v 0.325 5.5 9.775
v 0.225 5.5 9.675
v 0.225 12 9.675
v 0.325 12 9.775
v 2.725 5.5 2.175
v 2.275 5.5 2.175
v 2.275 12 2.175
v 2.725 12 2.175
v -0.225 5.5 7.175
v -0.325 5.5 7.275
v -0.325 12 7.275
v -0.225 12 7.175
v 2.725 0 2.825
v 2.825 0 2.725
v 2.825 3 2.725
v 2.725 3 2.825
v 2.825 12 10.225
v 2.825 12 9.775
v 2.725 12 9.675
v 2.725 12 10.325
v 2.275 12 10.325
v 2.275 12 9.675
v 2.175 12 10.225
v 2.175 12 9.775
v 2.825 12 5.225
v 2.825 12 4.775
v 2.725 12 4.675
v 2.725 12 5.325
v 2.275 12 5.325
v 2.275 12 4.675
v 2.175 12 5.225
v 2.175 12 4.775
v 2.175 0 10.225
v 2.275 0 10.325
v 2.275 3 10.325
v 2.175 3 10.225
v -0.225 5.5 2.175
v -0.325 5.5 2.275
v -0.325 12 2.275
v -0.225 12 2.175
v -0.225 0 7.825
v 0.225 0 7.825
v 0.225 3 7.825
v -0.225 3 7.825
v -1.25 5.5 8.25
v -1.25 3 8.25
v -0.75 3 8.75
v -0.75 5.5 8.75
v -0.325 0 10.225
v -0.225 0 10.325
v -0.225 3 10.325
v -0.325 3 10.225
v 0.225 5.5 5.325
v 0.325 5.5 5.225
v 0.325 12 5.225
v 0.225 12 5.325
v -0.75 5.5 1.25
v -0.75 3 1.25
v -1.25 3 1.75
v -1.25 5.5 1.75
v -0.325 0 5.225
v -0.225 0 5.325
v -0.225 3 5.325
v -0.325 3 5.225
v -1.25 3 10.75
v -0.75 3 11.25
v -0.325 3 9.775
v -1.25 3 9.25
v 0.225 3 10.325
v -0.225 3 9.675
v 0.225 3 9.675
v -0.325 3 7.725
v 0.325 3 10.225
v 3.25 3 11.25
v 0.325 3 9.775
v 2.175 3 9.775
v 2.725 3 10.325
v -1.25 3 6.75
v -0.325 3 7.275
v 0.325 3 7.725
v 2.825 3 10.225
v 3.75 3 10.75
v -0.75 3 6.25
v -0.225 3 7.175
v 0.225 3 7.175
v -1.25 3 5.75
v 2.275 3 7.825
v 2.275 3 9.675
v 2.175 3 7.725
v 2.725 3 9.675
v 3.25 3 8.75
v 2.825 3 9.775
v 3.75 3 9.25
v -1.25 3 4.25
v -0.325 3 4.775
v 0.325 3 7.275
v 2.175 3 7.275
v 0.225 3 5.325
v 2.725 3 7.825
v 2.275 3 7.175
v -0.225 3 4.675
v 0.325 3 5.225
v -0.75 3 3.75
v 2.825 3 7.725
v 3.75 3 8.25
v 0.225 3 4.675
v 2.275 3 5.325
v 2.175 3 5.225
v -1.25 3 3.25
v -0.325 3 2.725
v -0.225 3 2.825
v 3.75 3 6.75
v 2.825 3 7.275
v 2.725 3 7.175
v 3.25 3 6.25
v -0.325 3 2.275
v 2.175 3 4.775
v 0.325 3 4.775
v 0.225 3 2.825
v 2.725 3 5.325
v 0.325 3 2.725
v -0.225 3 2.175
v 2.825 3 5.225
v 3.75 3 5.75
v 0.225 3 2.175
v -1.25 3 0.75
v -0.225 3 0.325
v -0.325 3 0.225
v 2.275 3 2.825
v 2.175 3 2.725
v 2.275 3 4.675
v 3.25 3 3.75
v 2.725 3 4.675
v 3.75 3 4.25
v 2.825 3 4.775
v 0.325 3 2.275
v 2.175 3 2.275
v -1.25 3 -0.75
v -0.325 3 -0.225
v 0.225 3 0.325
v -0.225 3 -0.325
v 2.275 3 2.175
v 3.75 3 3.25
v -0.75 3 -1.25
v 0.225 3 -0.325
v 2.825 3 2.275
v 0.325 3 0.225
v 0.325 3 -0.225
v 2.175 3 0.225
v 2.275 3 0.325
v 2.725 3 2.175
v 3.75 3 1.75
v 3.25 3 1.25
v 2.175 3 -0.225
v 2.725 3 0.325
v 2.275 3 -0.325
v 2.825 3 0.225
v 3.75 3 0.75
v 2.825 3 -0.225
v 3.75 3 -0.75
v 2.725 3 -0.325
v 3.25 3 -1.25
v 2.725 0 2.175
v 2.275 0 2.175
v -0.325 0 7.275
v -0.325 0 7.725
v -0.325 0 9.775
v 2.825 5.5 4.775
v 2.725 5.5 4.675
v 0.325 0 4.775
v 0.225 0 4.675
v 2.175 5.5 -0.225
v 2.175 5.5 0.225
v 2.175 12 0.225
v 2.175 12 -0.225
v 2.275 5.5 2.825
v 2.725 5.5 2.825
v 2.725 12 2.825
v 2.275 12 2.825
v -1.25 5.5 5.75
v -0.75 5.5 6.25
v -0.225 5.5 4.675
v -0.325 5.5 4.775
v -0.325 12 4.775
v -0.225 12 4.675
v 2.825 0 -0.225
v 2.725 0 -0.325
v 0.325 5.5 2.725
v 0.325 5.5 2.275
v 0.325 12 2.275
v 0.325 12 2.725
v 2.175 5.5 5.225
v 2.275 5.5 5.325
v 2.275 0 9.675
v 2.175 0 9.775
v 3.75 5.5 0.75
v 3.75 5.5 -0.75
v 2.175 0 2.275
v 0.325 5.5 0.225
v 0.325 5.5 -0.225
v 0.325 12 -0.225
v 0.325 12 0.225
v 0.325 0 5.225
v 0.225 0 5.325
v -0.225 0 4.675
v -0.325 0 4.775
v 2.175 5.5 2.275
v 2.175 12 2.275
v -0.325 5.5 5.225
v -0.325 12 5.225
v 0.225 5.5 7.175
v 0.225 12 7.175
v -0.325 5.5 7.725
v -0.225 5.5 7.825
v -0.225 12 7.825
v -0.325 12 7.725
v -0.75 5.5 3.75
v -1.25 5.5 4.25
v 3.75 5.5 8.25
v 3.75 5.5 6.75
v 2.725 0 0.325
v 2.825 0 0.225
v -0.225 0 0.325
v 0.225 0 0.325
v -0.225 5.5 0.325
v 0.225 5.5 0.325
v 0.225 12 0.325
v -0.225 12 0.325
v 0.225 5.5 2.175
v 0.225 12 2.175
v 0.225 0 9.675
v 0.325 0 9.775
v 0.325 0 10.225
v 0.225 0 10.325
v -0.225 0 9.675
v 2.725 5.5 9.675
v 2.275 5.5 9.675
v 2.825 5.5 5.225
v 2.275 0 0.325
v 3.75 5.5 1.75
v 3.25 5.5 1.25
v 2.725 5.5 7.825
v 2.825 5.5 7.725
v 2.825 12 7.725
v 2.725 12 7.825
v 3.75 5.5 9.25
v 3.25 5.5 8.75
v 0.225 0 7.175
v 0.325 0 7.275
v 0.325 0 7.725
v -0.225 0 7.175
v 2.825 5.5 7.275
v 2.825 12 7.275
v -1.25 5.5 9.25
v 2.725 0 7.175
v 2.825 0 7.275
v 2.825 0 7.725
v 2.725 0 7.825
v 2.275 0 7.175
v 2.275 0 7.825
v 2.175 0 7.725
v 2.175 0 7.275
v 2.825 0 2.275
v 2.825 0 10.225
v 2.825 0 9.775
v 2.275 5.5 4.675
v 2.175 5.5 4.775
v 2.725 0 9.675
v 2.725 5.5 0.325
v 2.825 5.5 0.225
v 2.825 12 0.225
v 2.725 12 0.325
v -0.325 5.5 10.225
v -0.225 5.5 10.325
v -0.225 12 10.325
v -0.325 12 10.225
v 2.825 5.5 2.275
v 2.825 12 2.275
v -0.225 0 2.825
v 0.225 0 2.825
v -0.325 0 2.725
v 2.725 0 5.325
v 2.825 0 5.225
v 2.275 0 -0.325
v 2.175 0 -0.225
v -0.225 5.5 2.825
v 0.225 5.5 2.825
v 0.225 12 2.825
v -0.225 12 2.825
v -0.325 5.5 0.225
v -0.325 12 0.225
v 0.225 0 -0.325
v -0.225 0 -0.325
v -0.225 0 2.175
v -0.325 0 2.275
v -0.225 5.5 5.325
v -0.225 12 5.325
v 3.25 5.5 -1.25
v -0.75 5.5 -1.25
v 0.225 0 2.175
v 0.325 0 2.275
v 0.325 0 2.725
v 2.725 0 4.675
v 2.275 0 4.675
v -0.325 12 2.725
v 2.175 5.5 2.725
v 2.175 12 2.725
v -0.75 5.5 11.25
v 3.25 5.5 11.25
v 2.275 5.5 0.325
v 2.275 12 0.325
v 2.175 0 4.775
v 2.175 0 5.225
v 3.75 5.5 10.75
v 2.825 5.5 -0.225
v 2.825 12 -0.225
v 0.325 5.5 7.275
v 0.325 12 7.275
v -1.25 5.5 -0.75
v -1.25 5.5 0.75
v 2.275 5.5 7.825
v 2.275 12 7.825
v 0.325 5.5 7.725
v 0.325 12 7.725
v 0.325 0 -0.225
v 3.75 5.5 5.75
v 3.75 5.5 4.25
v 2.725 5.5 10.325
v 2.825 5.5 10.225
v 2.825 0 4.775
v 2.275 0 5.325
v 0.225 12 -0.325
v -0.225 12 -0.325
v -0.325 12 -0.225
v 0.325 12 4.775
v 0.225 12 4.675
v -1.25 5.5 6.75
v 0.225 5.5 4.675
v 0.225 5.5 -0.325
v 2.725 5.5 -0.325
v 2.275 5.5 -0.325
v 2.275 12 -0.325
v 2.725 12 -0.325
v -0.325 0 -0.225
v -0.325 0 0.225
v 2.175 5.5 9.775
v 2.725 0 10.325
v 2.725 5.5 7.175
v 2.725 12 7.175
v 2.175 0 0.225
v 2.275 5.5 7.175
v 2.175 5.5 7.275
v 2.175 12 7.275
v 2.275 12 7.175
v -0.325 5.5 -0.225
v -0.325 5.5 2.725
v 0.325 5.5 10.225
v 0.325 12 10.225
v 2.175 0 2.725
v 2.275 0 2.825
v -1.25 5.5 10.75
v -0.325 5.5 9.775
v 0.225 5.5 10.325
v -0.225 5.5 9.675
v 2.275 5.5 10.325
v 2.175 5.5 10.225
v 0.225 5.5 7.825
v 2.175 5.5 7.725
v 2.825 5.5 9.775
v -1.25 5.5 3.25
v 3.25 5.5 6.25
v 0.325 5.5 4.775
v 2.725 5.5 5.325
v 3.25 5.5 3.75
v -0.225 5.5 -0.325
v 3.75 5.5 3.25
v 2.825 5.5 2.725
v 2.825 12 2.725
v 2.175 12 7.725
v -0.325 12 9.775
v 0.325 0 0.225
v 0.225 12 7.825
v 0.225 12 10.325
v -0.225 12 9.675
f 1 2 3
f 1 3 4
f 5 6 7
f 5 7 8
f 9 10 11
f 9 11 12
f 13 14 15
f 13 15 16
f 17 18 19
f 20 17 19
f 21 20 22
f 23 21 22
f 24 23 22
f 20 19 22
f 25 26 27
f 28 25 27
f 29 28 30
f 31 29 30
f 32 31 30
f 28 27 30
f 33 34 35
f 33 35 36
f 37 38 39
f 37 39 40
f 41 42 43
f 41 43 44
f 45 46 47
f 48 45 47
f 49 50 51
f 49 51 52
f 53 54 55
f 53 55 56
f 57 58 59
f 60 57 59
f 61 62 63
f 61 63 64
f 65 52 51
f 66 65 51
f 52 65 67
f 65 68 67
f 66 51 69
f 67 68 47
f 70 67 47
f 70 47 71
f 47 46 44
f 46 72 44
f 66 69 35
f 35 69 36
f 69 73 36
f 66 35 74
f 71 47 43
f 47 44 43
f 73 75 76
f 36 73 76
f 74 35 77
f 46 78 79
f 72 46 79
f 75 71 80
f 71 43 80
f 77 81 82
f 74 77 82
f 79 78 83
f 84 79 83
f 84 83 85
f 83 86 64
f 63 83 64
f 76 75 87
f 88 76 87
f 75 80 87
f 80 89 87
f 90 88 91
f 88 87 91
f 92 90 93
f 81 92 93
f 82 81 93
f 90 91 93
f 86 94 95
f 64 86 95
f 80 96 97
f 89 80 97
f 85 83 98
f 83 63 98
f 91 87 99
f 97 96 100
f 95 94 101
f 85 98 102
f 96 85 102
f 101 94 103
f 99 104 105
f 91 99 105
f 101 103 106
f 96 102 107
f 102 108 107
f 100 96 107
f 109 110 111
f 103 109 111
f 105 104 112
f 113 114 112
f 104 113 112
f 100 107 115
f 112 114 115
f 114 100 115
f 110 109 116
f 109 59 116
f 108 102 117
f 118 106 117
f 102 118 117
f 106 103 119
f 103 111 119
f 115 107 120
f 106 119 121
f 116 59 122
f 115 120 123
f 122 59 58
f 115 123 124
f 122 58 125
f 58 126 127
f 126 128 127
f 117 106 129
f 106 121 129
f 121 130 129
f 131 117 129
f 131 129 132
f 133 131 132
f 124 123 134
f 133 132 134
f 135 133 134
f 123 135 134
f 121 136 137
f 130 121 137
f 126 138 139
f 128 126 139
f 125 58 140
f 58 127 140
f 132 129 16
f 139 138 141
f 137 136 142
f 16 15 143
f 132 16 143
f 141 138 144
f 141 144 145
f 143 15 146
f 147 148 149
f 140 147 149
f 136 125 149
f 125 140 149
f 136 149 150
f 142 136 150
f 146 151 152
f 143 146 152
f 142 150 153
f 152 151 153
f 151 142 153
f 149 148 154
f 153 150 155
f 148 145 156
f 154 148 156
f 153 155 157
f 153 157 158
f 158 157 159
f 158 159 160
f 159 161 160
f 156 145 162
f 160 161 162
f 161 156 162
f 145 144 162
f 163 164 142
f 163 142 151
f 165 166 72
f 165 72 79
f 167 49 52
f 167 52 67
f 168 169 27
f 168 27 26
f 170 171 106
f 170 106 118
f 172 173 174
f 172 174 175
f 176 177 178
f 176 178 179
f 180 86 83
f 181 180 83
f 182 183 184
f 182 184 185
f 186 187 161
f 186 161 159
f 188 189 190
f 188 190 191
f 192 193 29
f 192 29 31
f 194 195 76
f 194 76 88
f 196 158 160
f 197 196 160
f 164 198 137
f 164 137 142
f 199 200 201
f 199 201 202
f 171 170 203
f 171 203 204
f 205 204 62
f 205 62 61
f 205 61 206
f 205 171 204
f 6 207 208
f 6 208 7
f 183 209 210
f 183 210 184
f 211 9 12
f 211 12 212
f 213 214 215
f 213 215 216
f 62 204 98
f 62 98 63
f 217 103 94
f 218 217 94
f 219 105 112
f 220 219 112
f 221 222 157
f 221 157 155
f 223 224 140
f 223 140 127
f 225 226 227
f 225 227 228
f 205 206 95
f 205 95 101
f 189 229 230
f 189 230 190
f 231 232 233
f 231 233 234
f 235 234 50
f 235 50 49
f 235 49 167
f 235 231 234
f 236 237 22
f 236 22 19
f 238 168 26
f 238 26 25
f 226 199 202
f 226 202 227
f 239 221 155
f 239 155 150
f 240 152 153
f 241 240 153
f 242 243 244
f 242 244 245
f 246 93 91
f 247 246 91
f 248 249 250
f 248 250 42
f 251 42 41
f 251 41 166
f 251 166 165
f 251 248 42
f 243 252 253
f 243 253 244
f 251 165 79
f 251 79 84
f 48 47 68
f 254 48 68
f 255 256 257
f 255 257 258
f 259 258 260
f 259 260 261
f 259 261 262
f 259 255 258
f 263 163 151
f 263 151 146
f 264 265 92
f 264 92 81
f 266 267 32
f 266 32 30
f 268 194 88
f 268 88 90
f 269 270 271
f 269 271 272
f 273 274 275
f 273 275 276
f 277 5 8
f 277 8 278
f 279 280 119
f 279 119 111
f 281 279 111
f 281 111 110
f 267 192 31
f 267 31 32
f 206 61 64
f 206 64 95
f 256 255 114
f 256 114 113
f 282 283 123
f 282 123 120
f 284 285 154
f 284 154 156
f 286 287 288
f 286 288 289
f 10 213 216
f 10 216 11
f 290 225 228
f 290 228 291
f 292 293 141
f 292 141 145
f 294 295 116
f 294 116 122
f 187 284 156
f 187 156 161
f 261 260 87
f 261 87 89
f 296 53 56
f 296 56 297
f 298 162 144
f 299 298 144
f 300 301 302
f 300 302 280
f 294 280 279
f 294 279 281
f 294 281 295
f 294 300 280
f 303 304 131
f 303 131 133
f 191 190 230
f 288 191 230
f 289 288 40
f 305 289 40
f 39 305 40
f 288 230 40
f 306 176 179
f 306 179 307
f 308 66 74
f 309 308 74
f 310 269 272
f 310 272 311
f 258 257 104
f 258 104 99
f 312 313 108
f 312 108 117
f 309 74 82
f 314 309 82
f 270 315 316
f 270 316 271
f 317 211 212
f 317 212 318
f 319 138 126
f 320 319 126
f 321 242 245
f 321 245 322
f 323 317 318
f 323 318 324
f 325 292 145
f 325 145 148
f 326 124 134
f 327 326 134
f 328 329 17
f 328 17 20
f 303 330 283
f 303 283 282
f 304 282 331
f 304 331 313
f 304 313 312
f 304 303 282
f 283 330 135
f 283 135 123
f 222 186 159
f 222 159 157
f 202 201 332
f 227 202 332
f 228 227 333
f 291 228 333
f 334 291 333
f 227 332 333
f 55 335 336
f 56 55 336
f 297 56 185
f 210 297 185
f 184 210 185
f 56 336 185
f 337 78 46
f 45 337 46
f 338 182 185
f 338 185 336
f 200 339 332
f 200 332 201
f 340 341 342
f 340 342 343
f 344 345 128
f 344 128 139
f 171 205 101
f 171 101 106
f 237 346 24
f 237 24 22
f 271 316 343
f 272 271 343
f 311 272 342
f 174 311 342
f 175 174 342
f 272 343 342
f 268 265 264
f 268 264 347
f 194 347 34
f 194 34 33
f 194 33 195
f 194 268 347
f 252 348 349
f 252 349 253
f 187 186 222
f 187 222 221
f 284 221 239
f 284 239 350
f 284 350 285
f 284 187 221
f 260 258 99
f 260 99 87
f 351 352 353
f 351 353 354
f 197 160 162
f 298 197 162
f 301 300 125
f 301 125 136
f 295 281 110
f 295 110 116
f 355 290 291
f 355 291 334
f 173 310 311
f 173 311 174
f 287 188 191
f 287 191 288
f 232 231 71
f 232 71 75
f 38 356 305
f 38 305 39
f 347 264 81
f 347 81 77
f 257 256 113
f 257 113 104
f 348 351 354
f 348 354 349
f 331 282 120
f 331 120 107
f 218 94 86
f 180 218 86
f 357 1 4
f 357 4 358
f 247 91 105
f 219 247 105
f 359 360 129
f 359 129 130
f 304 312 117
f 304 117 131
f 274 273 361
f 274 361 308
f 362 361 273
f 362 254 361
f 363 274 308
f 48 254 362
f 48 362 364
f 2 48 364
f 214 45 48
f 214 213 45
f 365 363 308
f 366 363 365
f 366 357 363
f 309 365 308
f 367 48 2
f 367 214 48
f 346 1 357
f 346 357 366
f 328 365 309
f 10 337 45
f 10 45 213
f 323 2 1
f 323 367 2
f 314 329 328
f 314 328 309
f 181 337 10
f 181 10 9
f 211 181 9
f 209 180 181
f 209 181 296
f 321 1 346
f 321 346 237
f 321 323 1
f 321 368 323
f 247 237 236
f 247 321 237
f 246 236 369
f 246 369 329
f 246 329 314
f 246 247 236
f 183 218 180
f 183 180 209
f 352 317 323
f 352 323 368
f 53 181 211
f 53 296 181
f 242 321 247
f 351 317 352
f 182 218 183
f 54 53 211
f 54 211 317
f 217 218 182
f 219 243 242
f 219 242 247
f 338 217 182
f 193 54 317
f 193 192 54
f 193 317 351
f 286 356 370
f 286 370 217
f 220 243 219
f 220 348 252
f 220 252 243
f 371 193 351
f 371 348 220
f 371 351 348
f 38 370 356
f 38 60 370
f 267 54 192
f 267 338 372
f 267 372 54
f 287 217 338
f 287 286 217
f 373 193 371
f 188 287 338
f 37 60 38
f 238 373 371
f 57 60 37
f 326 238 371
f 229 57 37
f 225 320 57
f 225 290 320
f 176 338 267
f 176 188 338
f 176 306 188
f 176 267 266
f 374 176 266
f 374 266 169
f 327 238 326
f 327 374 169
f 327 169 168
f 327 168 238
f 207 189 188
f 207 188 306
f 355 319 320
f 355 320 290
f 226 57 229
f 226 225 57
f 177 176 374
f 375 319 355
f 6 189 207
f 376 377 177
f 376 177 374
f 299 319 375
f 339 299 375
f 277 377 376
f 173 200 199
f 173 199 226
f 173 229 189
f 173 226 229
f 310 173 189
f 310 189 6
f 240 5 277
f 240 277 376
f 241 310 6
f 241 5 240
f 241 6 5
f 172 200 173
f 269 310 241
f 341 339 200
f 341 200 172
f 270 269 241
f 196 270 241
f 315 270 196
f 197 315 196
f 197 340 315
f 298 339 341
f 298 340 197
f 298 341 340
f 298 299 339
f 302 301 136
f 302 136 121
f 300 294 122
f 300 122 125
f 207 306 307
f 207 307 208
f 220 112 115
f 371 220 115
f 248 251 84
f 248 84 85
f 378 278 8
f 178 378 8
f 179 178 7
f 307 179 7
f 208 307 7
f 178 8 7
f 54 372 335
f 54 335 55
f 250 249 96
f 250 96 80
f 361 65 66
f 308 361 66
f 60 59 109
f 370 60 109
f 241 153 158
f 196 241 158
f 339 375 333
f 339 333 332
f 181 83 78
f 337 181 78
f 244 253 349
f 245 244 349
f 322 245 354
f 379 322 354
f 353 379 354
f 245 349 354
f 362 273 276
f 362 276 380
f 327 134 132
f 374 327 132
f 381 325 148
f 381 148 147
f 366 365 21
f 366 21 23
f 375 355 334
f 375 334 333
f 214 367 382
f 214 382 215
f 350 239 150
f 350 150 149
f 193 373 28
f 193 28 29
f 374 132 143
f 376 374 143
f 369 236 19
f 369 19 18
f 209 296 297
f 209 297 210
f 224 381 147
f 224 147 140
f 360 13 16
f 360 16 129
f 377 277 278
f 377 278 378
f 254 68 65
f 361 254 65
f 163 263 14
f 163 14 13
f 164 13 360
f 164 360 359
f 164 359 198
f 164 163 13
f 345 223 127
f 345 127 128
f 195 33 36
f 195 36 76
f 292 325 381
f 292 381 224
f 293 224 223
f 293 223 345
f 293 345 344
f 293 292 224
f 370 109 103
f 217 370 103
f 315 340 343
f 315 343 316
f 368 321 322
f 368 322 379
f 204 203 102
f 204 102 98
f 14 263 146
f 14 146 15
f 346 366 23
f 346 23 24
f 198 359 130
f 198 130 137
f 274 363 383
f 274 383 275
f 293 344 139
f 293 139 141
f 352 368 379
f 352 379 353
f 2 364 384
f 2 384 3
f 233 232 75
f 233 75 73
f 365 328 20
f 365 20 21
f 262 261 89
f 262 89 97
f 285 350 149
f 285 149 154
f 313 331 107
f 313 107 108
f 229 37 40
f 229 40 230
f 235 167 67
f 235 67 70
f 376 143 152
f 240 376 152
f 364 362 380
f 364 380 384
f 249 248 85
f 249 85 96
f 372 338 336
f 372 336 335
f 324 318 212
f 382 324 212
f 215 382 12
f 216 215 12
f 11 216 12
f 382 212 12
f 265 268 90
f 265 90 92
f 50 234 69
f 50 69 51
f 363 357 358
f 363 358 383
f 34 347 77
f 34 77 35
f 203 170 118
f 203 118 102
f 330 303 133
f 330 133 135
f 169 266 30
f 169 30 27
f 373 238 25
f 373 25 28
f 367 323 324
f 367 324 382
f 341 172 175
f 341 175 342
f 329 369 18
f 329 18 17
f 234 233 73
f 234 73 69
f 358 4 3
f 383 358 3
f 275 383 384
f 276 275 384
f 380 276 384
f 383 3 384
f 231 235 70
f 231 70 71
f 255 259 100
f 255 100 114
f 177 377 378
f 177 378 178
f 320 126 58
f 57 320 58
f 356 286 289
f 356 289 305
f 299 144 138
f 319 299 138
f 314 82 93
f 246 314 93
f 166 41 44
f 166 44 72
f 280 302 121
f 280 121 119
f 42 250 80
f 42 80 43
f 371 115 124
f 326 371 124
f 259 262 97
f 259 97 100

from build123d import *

# Parameters (mm, degrees)
BOSS_EXTRUDE1_DEPTH = 12
LPATTERN1_COUNT     = 2
LPATTERN1_PITCH     = 2.5
BOSS_EXTRUDE3_DEPTH = 2.5
LPATTERN3_COUNT     = 5
LPATTERN3_PITCH     = 2.5


with BuildPart() as part:
    # Sketch1 → Boss-Extrude1 (new body)
    with BuildSketch(Plane(origin=(0, 0, 0), x_dir=(1, 0, 0), z_dir=(0, 1, 0))):
        Polygon((-0.325, 0.225), (-0.225, 0.325), (0.225, 0.325), (0.325, 0.225), (0.325, -0.225), (0.225, -0.325), (-0.225, -0.325), (-0.325, -0.225), align=None)
    extrude(amount=BOSS_EXTRUDE1_DEPTH)


with BuildPart() as lpattern1_1:
    # LPattern1: pattern copy
    add(part.part.moved(Location(Vector(1, 0, 0) * (1 * LPATTERN1_PITCH))))


with BuildPart() as part_1:
    add(part.part)

    add(lpattern1_1.part)  # Boss-Extrude3 merges LPattern1_1
    # Sketch3 → Boss-Extrude3 (add)
    with BuildSketch(Plane(origin=(0, 3, 0), x_dir=(-1, 0, 0), z_dir=(0, -1, 0))):
        Polygon((-3.75, 0.75), (-3.25, 1.25), (0.75, 1.25), (1.25, 0.75), (1.25, -0.75), (0.75, -1.25), (-3.25, -1.25), (-3.75, -0.75), align=None)
    extrude(amount=-BOSS_EXTRUDE3_DEPTH)


with BuildPart() as lpattern3_1:
    # LPattern3: pattern copy
    add(part_1.part.moved(Location(Vector(0, 0, 1) * (1 * LPATTERN3_PITCH))))


with BuildPart() as lpattern3_2:
    # LPattern3: pattern copy
    add(part_1.part.moved(Location(Vector(0, 0, 1) * (2 * LPATTERN3_PITCH))))


with BuildPart() as lpattern3_3:
    # LPattern3: pattern copy
    add(part_1.part.moved(Location(Vector(0, 0, 1) * (3 * LPATTERN3_PITCH))))


with BuildPart() as lpattern3_4:
    # LPattern3: pattern copy
    add(part_1.part.moved(Location(Vector(0, 0, 1) * (4 * LPATTERN3_PITCH))))


with BuildPart() as part_2:
    add(part_1.part)

    # Combine1: union LPattern3_1, LPattern3_2, LPattern3_3, LPattern3_4
    add(lpattern3_1.part)
    add(lpattern3_2.part)
    add(lpattern3_3.part)
    add(lpattern3_4.part)


solid = part_2.part
